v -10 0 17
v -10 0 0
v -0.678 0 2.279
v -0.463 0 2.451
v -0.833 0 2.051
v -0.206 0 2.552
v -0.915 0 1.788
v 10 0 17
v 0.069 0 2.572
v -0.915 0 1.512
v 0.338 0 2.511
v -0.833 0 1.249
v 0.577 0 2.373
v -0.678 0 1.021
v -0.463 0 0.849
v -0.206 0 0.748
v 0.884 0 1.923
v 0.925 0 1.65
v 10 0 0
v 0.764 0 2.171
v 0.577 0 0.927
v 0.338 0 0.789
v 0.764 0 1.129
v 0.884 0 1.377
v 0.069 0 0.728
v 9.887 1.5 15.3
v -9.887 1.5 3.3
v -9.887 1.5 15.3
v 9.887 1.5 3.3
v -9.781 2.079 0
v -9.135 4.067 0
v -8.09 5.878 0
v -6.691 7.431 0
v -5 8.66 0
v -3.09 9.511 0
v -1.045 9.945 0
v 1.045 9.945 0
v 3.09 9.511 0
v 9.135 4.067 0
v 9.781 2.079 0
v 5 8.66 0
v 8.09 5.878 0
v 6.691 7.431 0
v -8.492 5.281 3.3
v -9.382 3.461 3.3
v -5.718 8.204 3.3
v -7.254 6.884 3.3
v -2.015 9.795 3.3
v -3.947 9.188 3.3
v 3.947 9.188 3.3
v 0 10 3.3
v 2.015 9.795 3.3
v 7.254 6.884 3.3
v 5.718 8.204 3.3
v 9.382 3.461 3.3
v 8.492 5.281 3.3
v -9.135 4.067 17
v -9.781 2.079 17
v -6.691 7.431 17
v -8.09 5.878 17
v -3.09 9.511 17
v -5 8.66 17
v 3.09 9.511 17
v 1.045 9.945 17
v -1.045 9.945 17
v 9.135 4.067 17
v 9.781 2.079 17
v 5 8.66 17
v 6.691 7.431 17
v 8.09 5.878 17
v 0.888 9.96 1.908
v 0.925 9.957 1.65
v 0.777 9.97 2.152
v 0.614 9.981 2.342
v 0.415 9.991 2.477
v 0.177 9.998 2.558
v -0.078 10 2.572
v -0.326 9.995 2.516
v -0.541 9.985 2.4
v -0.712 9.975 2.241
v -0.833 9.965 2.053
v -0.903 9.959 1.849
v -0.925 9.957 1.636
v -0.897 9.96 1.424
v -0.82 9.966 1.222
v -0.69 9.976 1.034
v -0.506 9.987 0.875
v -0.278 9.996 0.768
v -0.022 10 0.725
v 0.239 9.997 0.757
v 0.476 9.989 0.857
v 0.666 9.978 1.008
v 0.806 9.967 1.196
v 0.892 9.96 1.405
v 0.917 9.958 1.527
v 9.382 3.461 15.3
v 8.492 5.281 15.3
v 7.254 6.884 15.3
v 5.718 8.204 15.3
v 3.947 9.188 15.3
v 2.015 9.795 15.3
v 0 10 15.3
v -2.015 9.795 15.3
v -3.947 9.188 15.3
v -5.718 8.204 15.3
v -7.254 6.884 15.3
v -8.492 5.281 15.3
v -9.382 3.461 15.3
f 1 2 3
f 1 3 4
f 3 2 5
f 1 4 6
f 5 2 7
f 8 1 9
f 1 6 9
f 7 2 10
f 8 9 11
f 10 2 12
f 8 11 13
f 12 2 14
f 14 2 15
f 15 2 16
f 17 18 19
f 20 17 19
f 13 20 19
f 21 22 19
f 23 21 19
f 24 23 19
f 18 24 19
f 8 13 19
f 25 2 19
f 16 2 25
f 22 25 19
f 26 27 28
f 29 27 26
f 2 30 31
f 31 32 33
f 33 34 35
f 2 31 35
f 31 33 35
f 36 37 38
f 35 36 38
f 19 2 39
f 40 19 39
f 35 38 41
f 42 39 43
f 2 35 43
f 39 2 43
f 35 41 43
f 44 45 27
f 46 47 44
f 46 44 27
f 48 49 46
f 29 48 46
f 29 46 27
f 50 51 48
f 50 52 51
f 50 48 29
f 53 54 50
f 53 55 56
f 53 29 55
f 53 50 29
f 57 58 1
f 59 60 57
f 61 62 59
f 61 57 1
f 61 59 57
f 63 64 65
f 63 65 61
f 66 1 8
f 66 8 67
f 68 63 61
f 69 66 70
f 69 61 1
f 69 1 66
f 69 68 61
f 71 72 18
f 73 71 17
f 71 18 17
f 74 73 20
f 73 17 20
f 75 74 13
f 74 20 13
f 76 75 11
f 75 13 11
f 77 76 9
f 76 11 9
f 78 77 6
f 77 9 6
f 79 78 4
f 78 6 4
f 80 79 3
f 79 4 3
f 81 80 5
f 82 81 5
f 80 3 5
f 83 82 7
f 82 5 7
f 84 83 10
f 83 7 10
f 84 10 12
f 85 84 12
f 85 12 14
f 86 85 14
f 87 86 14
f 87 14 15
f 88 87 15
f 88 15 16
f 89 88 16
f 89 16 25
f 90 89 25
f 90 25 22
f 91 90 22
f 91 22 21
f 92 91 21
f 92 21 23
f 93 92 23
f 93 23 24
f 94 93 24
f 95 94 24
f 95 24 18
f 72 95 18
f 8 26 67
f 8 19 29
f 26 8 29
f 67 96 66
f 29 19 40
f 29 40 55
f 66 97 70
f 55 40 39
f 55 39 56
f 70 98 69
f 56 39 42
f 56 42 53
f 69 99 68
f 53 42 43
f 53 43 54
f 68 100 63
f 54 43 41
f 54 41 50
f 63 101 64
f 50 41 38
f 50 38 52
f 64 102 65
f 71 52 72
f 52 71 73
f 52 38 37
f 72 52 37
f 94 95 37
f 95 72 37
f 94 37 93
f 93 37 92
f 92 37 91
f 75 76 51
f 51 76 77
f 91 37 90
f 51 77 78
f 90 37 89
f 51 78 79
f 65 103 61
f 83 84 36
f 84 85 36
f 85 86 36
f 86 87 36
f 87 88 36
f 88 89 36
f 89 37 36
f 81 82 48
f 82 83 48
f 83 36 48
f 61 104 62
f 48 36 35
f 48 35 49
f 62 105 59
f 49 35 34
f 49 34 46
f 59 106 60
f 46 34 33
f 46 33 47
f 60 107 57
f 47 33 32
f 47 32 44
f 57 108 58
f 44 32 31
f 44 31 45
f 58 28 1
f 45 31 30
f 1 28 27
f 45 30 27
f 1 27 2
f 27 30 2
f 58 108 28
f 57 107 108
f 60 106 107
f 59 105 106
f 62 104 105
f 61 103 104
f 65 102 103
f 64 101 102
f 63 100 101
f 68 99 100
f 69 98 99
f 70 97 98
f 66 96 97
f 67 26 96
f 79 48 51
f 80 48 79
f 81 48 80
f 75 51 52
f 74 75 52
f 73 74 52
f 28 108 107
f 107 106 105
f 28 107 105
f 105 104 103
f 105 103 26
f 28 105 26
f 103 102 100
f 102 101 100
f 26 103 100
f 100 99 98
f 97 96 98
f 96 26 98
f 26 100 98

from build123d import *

# Parameters (mm, degrees)
F1_DEPTH = 17
F3_W     = 22
F3_H     = 12
F4_DEPTH = 12
F5_R     = 0.925
F6_DEPTH = 12


with BuildPart() as f1:
    # F0 (on Top) → F1 (new body)
    with BuildSketch(Plane.XY):
        with BuildLine():
            Line((-10, 0), (10, 0))
            ThreePointArc((10, 0), (0, 10), (-10, 0))
        make_face()
    extrude(amount=F1_DEPTH)

    # F3 (on offset) → F4 (cut)
    with BuildSketch(Plane.XY.offset(3.3)):
        with Locations((-0.410548, 7.5)):
            Rectangle(F3_W, F3_H)
    extrude(amount=F4_DEPTH, mode=Mode.SUBTRACT)

    # F5 (on Front) → F6 (cut)
    with BuildSketch(Plane.XZ):
        with Locations((0, 1.65)):
            Circle(F5_R)
    extrude(amount=-F6_DEPTH, mode=Mode.SUBTRACT)


solid = f1.part
